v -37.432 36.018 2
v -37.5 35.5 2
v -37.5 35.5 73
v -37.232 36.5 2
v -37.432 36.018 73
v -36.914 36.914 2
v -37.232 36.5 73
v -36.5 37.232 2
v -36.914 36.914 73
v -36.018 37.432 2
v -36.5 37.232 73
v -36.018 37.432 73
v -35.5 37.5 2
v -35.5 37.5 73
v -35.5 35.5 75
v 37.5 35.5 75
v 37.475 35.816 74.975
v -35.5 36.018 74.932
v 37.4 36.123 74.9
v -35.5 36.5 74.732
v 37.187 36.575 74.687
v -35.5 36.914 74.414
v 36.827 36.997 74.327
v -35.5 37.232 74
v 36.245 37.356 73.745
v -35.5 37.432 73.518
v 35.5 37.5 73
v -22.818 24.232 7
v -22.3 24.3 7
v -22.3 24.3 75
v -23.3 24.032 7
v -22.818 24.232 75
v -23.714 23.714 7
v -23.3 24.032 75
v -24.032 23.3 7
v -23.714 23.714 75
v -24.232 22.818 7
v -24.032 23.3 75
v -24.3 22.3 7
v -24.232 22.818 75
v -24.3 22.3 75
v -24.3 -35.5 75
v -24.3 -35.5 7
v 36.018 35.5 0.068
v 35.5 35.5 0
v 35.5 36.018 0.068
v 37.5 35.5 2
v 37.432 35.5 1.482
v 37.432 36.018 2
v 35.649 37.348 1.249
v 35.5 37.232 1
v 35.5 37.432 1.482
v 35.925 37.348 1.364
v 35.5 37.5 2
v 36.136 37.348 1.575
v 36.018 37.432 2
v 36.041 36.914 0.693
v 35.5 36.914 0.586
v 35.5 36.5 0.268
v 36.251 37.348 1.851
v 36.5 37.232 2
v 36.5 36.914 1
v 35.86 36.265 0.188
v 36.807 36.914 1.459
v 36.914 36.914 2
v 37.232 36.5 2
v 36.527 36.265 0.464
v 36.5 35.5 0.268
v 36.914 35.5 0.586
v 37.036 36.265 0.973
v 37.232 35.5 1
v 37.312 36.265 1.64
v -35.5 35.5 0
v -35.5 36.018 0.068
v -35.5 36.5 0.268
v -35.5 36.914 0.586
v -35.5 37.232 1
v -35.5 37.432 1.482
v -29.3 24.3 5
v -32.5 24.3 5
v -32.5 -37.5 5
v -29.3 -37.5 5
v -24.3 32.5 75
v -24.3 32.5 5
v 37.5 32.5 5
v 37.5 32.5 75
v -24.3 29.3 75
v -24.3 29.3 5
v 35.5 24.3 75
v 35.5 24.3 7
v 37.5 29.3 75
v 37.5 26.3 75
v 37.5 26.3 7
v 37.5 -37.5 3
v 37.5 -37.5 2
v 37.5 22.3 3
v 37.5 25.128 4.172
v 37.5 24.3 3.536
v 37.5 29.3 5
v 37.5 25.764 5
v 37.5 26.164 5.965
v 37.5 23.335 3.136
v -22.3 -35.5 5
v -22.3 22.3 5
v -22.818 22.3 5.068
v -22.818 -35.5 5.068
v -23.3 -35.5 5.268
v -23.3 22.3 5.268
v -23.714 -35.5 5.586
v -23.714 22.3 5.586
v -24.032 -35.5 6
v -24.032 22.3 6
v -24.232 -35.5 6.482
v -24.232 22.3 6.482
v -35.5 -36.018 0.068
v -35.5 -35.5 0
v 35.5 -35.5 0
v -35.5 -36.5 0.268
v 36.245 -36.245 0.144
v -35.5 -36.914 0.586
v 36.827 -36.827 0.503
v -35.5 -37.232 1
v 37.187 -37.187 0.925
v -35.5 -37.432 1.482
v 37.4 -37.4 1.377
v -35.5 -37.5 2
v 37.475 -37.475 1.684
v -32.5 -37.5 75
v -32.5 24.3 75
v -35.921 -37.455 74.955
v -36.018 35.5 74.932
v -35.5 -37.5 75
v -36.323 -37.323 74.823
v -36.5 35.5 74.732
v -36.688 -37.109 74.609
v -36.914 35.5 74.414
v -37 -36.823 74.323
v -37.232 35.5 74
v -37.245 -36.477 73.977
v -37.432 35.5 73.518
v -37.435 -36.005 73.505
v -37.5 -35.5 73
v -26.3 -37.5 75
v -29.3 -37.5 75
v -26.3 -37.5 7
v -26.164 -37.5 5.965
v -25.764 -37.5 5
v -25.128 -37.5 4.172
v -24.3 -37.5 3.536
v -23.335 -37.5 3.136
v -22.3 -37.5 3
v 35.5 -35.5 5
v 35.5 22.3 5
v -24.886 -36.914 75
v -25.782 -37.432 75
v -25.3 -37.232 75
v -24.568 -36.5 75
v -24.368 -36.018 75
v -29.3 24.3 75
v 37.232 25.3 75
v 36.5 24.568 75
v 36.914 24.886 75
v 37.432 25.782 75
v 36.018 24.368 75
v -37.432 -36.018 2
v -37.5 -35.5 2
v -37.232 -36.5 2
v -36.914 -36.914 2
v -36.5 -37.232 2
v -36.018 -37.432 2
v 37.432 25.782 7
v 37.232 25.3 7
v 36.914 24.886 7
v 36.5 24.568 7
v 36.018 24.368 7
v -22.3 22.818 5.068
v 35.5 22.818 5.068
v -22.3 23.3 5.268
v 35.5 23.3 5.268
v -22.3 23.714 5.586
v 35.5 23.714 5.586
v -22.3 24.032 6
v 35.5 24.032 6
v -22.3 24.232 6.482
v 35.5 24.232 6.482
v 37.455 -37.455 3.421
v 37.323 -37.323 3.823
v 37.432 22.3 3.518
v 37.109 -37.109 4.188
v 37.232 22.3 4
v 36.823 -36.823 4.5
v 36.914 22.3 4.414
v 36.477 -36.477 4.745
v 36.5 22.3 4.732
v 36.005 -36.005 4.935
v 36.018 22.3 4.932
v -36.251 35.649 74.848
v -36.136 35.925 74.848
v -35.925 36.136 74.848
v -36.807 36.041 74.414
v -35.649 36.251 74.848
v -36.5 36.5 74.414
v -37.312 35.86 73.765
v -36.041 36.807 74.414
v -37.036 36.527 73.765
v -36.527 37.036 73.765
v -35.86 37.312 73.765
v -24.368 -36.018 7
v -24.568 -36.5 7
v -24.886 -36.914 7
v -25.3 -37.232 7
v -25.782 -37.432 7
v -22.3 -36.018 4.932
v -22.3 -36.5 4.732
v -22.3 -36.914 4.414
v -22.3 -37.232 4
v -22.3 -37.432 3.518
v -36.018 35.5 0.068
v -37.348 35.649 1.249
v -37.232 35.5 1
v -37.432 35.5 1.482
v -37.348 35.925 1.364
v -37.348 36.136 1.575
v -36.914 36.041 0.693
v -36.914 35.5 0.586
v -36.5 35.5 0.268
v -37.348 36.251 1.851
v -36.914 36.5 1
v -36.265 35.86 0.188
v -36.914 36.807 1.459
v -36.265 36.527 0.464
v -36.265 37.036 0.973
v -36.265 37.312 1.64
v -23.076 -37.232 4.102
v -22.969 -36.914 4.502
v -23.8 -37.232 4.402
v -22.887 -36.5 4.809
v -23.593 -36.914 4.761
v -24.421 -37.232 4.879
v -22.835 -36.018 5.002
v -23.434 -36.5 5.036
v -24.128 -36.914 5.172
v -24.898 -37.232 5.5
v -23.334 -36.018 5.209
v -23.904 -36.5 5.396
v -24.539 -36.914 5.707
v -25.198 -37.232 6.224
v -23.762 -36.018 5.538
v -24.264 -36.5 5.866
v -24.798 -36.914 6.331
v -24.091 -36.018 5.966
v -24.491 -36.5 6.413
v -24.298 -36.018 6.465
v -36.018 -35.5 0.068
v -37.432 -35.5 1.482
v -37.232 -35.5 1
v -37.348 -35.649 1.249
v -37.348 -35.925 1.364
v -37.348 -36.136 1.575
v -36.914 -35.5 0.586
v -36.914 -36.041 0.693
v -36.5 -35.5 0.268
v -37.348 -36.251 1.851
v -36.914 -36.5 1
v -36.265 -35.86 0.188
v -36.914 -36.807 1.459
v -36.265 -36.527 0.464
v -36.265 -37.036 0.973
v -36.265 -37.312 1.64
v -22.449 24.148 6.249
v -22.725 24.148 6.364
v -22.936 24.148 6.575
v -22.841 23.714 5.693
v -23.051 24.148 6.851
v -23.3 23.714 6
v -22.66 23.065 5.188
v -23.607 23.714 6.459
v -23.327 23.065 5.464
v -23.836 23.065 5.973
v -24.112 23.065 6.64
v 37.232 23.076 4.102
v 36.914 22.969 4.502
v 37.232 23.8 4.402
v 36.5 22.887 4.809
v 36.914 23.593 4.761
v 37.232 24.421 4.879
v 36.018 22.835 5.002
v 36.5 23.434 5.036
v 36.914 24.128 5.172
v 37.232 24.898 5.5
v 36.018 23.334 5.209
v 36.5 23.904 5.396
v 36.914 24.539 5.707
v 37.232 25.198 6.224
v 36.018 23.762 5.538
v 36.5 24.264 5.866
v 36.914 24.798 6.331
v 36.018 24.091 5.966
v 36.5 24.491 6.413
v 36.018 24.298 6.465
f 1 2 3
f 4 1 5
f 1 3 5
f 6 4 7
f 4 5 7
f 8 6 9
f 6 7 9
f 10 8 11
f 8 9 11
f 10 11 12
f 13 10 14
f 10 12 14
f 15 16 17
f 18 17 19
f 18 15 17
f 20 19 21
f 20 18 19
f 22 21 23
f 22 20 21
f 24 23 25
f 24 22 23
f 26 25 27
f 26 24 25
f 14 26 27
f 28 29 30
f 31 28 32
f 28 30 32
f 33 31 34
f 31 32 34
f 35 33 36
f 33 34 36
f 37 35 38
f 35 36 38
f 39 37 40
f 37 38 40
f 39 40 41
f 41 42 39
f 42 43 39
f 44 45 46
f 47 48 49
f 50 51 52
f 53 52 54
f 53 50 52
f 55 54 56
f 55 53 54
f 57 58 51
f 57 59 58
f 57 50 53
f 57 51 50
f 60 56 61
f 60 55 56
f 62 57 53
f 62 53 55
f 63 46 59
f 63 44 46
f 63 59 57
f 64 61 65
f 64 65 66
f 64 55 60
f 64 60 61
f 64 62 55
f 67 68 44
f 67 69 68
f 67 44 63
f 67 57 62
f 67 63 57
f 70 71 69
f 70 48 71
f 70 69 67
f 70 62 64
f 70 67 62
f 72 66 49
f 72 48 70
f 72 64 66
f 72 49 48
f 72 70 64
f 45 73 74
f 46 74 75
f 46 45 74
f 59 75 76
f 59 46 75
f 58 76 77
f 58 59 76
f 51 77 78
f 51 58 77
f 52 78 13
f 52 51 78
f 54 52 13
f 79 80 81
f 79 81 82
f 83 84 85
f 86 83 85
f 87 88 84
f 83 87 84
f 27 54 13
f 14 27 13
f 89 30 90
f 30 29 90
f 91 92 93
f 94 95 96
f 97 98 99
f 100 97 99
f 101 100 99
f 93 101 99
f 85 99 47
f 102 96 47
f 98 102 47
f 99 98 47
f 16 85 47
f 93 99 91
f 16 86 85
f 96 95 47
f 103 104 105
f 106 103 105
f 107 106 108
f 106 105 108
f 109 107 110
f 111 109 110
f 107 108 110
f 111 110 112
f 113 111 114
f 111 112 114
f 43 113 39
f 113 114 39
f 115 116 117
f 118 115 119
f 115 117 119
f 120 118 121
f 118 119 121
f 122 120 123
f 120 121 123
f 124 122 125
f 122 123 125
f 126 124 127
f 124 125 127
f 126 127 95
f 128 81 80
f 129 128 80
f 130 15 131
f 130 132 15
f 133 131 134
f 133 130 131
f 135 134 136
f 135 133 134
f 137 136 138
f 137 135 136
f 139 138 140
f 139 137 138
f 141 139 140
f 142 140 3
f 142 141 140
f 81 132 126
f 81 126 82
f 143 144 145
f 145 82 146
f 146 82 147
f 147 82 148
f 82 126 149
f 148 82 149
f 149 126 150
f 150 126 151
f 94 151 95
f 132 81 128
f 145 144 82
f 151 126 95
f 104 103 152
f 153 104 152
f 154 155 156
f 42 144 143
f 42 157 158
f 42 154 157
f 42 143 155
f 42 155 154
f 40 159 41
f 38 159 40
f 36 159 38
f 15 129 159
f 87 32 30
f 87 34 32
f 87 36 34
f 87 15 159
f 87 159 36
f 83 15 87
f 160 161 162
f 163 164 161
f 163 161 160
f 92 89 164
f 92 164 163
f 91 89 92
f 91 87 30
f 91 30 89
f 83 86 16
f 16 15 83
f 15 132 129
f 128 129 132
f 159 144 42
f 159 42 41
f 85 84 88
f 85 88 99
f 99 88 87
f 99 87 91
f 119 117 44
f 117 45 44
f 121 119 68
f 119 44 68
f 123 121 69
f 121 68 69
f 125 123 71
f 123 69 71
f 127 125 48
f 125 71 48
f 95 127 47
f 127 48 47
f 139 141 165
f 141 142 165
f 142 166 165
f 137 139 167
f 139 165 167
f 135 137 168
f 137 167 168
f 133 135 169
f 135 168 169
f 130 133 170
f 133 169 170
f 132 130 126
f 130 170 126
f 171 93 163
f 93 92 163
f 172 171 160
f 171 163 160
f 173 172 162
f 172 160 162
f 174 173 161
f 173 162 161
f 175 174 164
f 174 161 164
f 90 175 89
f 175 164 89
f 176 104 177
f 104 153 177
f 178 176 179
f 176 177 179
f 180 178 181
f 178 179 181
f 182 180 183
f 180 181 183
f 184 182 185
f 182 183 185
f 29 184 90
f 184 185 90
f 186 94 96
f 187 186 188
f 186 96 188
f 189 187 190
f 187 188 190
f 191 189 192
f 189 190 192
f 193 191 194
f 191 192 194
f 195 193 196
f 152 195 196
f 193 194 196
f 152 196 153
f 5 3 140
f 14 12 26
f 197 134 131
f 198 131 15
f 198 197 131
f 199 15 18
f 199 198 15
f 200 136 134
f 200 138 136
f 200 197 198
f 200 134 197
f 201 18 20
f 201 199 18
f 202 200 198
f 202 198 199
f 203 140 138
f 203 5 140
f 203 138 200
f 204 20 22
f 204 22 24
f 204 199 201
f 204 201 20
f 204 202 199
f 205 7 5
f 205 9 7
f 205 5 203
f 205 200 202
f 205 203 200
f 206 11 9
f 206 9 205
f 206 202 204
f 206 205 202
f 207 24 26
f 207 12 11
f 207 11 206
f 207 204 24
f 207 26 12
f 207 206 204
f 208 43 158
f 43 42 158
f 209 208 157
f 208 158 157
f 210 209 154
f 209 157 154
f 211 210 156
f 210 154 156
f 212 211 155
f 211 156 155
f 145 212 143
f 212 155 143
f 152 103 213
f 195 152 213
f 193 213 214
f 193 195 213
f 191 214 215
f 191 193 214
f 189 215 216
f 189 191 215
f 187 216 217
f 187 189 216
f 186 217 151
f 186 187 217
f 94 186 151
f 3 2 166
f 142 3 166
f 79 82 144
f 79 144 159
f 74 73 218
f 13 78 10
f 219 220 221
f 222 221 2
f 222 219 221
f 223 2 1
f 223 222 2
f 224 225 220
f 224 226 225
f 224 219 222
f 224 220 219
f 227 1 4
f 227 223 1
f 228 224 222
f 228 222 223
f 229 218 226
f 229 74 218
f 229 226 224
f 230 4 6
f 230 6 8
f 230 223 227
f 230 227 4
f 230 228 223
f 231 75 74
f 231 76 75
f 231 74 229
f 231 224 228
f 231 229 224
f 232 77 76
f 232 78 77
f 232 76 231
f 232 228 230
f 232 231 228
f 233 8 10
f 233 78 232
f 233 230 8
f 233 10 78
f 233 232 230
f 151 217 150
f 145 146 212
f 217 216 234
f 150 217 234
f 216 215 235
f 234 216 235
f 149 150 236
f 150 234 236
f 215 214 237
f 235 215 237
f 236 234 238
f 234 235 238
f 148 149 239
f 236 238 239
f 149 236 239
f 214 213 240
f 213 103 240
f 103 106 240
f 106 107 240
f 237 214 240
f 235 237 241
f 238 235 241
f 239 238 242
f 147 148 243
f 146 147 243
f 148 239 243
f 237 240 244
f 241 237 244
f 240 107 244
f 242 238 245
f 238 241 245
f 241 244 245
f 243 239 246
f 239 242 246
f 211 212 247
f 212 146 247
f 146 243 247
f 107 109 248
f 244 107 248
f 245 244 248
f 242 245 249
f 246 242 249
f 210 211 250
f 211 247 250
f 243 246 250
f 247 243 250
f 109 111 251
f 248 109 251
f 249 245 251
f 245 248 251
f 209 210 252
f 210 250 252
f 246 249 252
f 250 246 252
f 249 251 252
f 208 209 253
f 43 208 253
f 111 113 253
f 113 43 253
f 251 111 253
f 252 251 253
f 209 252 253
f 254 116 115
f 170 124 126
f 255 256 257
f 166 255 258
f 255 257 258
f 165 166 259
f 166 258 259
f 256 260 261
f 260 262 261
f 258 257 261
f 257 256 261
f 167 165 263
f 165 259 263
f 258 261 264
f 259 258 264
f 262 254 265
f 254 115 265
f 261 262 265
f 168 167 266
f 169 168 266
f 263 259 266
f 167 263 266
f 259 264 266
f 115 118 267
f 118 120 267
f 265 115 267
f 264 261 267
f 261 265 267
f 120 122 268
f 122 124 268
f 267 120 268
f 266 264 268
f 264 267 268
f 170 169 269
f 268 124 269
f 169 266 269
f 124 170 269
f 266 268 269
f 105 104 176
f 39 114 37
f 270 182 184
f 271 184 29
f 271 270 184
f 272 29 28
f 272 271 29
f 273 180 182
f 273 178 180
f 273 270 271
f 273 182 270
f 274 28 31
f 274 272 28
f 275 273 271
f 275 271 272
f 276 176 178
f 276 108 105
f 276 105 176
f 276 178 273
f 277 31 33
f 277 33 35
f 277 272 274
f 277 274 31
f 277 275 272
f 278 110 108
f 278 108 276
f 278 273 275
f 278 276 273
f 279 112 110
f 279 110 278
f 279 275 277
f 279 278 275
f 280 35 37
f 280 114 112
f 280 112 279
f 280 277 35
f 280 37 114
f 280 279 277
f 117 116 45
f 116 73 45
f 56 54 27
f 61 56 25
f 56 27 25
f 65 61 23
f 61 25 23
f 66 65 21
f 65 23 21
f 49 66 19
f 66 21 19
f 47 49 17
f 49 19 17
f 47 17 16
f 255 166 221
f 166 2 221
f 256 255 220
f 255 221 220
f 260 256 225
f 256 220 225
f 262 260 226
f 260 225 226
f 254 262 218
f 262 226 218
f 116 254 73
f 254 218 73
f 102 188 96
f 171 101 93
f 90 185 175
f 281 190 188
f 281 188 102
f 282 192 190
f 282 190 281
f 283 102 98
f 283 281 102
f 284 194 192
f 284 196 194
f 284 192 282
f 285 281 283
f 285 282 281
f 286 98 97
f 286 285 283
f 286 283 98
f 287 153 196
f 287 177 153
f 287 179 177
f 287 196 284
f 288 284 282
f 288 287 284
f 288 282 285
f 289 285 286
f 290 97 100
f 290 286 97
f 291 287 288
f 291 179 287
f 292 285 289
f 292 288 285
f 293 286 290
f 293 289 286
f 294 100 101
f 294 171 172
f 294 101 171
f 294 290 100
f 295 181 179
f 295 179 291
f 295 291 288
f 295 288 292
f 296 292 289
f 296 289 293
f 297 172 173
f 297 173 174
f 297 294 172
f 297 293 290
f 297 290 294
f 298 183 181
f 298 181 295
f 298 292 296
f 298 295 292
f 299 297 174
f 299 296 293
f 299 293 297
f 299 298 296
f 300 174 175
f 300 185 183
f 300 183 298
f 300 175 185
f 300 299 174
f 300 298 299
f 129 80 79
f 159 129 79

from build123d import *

# Parameters (mm, degrees)
F0_W     = 75
F0_H     = 75
F1_DEPTH = 5
F2_W     = 5
F2_H     = 5
F2_W_2   = 3.2
F2_H_2   = 3.2
F2_W_3   = 61.8
F2_H_3   = 61.8
F3_DEPTH = 70
F4_R     = 2
F5_W     = 3.2
F5_H     = 3.2
F6_DEPTH = 75


# Not quite as in the source:
# - a feature names something its author has since deleted; it is built from what else it names


with BuildPart() as f1:
    # F0 (on Top) → F1 (new body)
    with BuildSketch(Plane.XY):
        Rectangle(F0_W, F0_H)
    extrude(amount=F1_DEPTH)

    # F2 (on face) → F3 (join)
    with BuildSketch(Plane.XY.offset(5)):
        with Locations((-35, 35)):
            Rectangle(F2_W, F2_H)
        with Locations((-30.9, 35)):
            Rectangle(F2_W_2, F2_H)
        with Locations((-35, 30.9)):
            Rectangle(F2_W, F2_H_2)
        with Locations((-26.8, 35)):
            Rectangle(F2_W, F2_H)
        with Locations((-35, 26.8)):
            Rectangle(F2_W, F2_H)
        with Locations((-30.9, 26.8)):
            Rectangle(F2_W_2, F2_H)
        with Locations((-26.8, 30.9)):
            Rectangle(F2_W, F2_H_2)
        with Locations((6.6, 35)):
            Rectangle(F2_W_3, F2_H)
        with Locations((-35, -6.6)):
            Rectangle(F2_W, F2_H_3)
        with Locations((-26.8, 26.8)):
            Rectangle(F2_W, F2_H)
        with Locations((-26.8, -6.6)):
            Rectangle(F2_W, F2_H_3)
        with Locations((6.6, 26.8)):
            Rectangle(F2_W_3, F2_H)
    extrude(amount=F3_DEPTH)

    # F4
    f4_edges = [f1.edges().sort_by_distance(p)[0] for p in [
        (0, -37.5, 0),
        (37.5, 0, 0),
        (0, 37.5, 0),
        (-37.5, 0, 0),
        (-37.5, 37.5, 37.5),
        (-37.5, 0, 75),
        (-37.5, -37.5, 37.5),
        (37.5, 37.5, 37.5),
        (0, 37.5, 75),
        (-24.3, -6.6, 5),
        (6.6, 24.3, 5),
        (37.5, -6.6, 5),
        (6.6, -37.5, 5),
        (-24.3, 24.3, 40),
        (-24.3, -37.5, 40),
        (37.5, 24.3, 40),
    ]]
    fillet(f4_edges, radius=F4_R)

    # F5 (on face) → F6 (join, through all)
    with BuildSketch(Plane.XY.offset(75)):
        with Locations((-30.9, 30.9)):
            Rectangle(F5_W, F5_H)
    extrude(amount=-F6_DEPTH)


solid = f1.part
